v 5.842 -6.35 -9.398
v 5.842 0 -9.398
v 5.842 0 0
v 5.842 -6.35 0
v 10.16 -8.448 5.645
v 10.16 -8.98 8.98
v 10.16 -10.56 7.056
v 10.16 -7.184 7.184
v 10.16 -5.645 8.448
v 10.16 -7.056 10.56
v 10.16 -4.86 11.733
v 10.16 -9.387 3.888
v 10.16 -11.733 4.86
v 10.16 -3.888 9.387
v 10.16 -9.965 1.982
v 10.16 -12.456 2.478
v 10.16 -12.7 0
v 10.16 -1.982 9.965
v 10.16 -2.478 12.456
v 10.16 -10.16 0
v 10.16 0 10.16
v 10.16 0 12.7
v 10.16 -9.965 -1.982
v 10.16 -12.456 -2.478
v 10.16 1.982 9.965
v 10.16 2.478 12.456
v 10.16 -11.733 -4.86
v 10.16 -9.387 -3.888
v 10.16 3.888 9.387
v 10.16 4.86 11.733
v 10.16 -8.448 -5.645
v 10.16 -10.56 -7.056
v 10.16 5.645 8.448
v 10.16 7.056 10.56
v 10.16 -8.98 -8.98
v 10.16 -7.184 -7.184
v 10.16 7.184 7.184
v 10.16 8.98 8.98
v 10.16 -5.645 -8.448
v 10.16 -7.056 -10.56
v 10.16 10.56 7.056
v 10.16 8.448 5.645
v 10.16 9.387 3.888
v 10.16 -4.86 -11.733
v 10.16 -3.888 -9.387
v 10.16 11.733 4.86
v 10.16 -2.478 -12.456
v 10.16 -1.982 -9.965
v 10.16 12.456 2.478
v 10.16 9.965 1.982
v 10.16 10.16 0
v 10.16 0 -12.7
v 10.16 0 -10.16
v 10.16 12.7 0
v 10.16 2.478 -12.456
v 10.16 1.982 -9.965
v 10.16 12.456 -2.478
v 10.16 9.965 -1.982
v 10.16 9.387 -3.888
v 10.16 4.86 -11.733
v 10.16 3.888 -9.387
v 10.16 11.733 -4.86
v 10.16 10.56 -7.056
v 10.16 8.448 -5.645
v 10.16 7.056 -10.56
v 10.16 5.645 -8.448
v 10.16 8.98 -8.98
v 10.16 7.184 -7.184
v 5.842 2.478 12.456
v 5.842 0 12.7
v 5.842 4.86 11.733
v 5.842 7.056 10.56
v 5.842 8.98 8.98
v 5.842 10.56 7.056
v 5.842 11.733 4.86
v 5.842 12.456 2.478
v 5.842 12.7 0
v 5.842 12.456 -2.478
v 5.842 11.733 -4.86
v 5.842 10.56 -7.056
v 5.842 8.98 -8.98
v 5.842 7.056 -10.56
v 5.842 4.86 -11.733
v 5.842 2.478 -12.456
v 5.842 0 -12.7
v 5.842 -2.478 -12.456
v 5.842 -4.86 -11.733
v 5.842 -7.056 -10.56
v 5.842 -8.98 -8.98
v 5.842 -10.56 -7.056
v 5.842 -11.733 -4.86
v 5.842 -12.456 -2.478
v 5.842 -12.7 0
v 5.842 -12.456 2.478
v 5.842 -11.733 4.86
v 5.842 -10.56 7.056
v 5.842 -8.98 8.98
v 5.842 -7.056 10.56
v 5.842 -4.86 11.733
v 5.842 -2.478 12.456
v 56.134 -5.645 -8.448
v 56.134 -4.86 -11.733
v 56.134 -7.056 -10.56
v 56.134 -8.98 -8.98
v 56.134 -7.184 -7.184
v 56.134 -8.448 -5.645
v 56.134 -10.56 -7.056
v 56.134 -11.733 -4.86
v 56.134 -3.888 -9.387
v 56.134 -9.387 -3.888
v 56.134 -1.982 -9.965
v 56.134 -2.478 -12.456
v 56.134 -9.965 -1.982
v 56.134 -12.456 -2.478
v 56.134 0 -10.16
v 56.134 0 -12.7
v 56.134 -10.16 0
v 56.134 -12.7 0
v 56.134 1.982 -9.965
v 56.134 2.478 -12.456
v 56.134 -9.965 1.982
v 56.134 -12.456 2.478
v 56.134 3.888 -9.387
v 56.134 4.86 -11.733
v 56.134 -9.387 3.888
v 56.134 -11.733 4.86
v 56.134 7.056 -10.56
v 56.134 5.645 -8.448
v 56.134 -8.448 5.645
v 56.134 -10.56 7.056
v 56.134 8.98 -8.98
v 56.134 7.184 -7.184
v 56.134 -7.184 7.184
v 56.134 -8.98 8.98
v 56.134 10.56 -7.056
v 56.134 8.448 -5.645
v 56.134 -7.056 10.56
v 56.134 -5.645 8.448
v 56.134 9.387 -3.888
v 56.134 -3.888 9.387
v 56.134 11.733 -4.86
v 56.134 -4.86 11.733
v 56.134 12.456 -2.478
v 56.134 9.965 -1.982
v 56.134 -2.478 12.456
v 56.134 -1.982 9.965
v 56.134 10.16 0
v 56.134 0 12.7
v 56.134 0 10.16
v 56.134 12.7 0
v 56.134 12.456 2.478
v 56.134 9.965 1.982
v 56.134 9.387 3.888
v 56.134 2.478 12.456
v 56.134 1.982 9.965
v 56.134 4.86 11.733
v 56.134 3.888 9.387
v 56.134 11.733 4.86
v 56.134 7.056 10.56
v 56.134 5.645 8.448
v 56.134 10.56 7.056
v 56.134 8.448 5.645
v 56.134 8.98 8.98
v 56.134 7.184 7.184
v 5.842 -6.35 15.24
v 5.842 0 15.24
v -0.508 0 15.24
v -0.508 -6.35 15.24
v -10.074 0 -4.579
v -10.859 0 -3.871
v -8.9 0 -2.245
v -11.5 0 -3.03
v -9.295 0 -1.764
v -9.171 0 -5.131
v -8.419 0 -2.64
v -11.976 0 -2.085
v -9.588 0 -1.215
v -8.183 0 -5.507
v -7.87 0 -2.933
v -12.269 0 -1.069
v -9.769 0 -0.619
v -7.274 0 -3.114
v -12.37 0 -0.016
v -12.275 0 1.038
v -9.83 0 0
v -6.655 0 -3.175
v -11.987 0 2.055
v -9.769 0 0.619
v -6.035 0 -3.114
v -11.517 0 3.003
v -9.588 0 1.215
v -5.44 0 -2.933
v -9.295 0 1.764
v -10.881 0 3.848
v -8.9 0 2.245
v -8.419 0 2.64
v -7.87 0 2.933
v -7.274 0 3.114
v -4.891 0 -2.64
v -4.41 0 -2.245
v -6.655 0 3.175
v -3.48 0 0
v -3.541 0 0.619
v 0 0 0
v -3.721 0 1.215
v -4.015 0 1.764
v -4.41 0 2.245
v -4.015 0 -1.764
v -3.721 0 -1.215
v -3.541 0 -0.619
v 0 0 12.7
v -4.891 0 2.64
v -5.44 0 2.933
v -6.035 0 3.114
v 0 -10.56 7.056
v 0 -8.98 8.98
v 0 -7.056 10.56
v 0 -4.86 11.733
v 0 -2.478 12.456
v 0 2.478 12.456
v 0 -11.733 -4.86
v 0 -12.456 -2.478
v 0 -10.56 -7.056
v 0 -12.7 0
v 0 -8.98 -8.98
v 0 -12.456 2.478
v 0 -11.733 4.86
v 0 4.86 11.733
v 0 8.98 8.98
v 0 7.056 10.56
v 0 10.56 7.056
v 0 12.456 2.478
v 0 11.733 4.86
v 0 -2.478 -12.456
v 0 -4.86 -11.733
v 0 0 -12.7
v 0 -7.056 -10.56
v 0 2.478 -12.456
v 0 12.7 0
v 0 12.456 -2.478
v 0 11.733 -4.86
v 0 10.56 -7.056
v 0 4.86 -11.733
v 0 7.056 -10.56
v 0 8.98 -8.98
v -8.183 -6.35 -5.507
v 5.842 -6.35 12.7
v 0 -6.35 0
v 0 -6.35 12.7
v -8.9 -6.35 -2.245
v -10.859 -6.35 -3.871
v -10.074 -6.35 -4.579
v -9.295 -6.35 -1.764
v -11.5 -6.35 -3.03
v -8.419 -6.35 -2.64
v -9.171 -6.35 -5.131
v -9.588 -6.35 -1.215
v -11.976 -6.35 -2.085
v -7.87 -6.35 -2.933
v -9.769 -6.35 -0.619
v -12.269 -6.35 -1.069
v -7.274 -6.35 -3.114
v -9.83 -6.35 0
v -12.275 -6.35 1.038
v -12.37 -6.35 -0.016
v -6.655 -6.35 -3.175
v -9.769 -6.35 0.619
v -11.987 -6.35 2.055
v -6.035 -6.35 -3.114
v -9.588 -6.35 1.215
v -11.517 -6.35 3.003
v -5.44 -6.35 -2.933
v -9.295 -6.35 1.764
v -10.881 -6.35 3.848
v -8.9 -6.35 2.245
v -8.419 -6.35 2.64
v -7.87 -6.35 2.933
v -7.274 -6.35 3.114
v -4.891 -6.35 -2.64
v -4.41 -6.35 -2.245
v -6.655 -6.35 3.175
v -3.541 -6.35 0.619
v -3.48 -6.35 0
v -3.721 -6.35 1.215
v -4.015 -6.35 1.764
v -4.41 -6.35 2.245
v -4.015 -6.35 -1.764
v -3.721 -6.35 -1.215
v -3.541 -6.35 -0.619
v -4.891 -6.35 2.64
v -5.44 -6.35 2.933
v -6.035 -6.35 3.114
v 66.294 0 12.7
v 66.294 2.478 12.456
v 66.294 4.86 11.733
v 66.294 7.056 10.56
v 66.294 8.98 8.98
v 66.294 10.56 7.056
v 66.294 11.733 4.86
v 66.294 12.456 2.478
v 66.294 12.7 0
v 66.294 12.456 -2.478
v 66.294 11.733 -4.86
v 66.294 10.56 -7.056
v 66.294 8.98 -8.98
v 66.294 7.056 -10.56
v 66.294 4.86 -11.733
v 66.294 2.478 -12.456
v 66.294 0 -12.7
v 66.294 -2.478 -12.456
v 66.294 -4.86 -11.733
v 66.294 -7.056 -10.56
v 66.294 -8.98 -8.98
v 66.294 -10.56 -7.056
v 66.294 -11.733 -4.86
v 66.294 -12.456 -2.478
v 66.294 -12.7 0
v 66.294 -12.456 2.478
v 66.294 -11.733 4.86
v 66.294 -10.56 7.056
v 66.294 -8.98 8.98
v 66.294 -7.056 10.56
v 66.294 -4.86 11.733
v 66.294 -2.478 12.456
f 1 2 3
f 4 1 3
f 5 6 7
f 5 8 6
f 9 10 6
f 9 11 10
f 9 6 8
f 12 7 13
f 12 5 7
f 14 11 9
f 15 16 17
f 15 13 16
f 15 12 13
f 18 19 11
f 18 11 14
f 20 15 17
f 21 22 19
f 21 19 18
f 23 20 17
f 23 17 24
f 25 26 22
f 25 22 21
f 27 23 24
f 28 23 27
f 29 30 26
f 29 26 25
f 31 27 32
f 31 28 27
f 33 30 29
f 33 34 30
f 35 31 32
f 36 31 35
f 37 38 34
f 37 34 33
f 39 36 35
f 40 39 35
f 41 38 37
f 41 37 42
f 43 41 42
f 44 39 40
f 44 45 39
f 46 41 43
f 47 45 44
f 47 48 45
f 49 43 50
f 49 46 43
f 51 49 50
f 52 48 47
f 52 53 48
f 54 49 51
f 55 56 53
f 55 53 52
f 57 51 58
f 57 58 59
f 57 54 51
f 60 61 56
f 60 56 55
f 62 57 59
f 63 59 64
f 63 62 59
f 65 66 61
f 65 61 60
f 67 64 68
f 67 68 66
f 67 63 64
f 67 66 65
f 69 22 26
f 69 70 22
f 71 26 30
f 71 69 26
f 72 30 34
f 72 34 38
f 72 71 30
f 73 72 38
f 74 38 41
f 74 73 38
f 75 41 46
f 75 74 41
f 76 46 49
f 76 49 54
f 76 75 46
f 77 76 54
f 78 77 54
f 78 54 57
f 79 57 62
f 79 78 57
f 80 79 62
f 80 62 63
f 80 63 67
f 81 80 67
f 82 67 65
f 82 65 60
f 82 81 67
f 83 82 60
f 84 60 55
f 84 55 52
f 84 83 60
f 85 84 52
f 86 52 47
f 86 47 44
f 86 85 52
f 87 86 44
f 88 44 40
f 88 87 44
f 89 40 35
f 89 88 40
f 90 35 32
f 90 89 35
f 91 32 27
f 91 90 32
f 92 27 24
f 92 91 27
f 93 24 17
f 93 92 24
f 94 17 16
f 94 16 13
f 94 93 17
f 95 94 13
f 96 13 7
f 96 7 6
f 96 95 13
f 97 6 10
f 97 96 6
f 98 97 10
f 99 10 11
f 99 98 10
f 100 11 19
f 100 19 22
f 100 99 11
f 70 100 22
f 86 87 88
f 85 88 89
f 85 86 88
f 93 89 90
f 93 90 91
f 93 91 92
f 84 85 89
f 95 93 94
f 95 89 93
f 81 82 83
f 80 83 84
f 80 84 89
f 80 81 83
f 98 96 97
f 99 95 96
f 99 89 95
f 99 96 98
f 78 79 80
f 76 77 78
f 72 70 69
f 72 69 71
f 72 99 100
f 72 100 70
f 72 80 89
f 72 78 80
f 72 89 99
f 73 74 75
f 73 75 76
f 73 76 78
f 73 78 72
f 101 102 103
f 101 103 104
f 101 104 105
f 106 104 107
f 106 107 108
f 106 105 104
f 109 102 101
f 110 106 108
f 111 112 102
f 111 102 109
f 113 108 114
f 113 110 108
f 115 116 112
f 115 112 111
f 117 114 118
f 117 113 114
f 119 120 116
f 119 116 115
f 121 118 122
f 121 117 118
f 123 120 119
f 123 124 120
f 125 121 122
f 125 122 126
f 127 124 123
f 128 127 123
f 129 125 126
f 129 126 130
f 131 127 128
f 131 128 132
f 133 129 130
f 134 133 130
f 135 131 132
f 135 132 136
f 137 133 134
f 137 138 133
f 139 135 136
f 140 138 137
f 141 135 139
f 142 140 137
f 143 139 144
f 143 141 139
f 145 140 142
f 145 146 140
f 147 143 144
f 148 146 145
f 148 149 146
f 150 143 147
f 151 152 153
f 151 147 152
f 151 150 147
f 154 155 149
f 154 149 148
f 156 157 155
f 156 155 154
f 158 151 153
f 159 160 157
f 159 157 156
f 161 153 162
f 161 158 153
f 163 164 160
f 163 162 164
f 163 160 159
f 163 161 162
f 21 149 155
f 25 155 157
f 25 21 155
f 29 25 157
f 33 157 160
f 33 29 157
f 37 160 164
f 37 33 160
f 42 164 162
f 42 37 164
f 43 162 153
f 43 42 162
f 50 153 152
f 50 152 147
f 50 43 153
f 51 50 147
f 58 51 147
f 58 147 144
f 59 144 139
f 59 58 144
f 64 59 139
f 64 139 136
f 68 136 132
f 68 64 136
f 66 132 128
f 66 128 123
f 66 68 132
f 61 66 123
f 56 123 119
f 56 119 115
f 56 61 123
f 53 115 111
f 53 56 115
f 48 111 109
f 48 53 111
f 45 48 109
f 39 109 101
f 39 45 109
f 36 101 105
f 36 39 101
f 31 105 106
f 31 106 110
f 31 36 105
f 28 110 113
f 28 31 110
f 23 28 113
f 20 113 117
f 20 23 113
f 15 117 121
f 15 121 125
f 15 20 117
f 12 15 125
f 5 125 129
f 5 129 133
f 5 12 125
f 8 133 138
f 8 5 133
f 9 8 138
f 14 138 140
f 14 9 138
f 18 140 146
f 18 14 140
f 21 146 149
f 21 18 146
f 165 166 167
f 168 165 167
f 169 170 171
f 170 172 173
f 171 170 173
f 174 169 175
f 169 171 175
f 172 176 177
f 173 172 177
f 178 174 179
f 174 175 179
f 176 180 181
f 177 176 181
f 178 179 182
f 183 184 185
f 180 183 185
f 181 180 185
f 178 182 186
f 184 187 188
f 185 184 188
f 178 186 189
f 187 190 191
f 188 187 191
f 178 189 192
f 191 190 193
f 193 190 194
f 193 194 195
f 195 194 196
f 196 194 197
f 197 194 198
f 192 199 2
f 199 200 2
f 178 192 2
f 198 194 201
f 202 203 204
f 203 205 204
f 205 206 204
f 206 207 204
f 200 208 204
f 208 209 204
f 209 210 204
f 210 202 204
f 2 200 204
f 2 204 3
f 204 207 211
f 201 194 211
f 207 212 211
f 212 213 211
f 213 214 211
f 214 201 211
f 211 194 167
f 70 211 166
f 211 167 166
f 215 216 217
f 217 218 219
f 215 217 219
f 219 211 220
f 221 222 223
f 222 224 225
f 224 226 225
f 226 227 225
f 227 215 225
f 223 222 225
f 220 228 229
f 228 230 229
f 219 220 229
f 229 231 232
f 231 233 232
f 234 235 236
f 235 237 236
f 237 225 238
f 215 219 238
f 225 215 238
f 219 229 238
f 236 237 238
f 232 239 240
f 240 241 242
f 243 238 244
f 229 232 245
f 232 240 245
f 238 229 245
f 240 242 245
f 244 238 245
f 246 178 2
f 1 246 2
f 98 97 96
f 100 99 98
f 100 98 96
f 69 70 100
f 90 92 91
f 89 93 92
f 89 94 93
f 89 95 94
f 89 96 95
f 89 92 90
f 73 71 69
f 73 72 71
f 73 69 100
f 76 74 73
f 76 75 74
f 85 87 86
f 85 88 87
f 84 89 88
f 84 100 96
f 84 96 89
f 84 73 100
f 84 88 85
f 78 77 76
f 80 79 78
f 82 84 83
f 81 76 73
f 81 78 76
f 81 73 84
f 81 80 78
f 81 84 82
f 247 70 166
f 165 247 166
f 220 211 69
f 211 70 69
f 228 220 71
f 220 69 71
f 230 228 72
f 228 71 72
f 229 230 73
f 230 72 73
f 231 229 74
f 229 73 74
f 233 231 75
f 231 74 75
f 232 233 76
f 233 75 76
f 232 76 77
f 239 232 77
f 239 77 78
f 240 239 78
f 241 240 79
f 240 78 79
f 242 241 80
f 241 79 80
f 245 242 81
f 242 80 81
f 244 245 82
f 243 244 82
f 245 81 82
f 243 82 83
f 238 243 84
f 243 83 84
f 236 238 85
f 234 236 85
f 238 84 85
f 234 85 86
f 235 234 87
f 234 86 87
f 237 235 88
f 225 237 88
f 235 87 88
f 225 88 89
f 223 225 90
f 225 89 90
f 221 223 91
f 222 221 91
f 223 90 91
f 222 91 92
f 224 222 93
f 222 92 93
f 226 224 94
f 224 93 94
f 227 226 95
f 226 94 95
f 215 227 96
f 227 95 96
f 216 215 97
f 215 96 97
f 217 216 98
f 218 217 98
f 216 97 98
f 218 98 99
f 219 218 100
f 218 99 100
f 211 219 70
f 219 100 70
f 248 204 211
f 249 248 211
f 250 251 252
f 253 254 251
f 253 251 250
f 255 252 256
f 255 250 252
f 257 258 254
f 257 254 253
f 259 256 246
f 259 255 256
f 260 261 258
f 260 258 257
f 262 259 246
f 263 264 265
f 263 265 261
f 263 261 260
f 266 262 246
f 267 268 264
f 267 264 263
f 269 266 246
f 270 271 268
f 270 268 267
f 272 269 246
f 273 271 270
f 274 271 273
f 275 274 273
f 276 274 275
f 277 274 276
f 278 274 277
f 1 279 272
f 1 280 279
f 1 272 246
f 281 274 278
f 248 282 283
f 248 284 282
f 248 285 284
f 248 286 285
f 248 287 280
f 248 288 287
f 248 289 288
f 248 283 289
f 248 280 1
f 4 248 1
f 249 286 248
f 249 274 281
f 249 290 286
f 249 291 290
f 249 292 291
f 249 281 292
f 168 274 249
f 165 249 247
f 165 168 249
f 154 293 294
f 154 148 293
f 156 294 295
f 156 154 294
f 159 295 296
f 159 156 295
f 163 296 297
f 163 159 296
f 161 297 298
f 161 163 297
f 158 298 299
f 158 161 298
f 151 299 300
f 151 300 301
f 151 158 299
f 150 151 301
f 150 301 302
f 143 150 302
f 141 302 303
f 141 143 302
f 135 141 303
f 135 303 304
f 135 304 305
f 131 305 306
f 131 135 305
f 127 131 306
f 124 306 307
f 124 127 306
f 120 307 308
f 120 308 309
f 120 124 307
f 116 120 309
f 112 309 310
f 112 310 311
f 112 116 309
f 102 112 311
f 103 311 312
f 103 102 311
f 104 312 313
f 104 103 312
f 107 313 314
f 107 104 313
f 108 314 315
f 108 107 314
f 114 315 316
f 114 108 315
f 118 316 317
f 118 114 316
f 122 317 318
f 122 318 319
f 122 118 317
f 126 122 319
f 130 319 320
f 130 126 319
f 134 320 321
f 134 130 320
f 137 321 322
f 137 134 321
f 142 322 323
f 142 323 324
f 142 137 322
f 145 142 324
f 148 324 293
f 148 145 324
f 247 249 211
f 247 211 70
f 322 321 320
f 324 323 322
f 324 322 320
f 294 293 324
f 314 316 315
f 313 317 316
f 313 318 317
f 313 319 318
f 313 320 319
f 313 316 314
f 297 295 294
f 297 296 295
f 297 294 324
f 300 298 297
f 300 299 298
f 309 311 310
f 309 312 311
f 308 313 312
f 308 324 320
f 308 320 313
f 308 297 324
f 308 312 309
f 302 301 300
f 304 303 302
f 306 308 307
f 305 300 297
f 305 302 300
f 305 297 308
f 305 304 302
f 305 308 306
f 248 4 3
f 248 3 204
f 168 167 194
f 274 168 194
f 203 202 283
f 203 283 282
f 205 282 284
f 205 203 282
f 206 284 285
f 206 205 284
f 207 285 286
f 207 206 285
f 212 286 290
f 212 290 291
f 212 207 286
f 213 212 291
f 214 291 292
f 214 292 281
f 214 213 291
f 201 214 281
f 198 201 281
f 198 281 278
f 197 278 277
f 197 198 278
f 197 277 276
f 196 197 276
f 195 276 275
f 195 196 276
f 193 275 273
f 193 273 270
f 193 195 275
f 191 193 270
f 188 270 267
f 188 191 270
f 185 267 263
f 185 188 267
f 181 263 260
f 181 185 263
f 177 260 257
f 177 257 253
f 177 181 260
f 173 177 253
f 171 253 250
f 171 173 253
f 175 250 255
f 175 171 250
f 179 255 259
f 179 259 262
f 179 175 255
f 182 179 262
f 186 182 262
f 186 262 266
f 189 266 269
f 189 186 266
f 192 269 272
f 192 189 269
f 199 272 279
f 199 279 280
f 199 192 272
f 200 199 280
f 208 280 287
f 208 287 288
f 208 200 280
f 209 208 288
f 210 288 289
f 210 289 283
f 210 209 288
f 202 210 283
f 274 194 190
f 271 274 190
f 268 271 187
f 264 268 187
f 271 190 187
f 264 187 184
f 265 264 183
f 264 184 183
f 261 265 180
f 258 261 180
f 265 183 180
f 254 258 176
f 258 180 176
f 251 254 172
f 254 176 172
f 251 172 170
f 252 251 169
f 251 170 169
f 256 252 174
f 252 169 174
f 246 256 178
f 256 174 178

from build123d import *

# Parameters (mm, degrees)
F0_R     = 3.175
F2_DEPTH = 6.35
F0_W     = 5.842
F0_H     = 12.7


with BuildPart() as f1:
    # F0 (on Front) → F1 (revolve)
    with BuildSketch(Plane.XZ):
        Polygon((5.842, 12.7), (5.842, 0), (66.294, 0), (66.294, 12.7), (56.134, 12.7), (56.134, 10.16), (10.16, 10.16), (10.16, 12.7), align=None)
    revolve(axis=Axis((33.147, 0, 0), (-1, 0, 0)))


with BuildPart() as f2:
    # F0 (on Front) → F2 (new body)
    with BuildSketch(Plane.XZ):
        with BuildLine():
            Line((-0.9398, 0), (0, 0))
            Line((0, 0), (0, 12.7))
            Line((0, 12.7), (5.842, 12.7))
            Line((5.842, 12.7), (5.842, 15.24))
            Line((5.842, 15.24), (-0.508, 15.24))
            Line((-0.508, 15.24), (-10.88063, 3.847543))
            ThreePointArc((-10.88063, 3.847543), (-4.591961, 5.329721), (-0.9398, 0))
        make_face()
        with BuildLine():
            ThreePointArc((-8.182663, -5.506983), (-3.195791, -4.549339), (-0.9398, 0))
            ThreePointArc((-0.9398, 0), (-4.591961, 5.329721), (-10.88063, 3.847543))
            ThreePointArc((-10.88063, 3.847543), (-12.145978, -1.583727), (-8.182663, -5.506983))
        make_face()
        with Locations((-6.6548, 0)):
            Circle(F0_R, mode=Mode.SUBTRACT)
        with BuildLine():
            Line((5.842, 0), (0, 0))
            Line((0, 0), (-0.9398, 0))
            ThreePointArc((-0.9398, 0), (-3.195791, -4.549339), (-8.182663, -5.506983))
            Line((-8.182663, -5.506983), (5.842, -9.398))
            Line((5.842, -9.398), (5.842, 0))
        make_face()
    extrude(amount=F2_DEPTH)


with BuildPart() as f3:
    # F0 (on Front) → F3 (revolve)
    with BuildSketch(Plane.XZ):
        with Locations((2.921, 6.35)):
            Rectangle(F0_W, F0_H)
    revolve(axis=Axis((33.147, 0, 0), (-1, 0, 0)))


solid = Compound([f1.part, f2.part, f3.part])
